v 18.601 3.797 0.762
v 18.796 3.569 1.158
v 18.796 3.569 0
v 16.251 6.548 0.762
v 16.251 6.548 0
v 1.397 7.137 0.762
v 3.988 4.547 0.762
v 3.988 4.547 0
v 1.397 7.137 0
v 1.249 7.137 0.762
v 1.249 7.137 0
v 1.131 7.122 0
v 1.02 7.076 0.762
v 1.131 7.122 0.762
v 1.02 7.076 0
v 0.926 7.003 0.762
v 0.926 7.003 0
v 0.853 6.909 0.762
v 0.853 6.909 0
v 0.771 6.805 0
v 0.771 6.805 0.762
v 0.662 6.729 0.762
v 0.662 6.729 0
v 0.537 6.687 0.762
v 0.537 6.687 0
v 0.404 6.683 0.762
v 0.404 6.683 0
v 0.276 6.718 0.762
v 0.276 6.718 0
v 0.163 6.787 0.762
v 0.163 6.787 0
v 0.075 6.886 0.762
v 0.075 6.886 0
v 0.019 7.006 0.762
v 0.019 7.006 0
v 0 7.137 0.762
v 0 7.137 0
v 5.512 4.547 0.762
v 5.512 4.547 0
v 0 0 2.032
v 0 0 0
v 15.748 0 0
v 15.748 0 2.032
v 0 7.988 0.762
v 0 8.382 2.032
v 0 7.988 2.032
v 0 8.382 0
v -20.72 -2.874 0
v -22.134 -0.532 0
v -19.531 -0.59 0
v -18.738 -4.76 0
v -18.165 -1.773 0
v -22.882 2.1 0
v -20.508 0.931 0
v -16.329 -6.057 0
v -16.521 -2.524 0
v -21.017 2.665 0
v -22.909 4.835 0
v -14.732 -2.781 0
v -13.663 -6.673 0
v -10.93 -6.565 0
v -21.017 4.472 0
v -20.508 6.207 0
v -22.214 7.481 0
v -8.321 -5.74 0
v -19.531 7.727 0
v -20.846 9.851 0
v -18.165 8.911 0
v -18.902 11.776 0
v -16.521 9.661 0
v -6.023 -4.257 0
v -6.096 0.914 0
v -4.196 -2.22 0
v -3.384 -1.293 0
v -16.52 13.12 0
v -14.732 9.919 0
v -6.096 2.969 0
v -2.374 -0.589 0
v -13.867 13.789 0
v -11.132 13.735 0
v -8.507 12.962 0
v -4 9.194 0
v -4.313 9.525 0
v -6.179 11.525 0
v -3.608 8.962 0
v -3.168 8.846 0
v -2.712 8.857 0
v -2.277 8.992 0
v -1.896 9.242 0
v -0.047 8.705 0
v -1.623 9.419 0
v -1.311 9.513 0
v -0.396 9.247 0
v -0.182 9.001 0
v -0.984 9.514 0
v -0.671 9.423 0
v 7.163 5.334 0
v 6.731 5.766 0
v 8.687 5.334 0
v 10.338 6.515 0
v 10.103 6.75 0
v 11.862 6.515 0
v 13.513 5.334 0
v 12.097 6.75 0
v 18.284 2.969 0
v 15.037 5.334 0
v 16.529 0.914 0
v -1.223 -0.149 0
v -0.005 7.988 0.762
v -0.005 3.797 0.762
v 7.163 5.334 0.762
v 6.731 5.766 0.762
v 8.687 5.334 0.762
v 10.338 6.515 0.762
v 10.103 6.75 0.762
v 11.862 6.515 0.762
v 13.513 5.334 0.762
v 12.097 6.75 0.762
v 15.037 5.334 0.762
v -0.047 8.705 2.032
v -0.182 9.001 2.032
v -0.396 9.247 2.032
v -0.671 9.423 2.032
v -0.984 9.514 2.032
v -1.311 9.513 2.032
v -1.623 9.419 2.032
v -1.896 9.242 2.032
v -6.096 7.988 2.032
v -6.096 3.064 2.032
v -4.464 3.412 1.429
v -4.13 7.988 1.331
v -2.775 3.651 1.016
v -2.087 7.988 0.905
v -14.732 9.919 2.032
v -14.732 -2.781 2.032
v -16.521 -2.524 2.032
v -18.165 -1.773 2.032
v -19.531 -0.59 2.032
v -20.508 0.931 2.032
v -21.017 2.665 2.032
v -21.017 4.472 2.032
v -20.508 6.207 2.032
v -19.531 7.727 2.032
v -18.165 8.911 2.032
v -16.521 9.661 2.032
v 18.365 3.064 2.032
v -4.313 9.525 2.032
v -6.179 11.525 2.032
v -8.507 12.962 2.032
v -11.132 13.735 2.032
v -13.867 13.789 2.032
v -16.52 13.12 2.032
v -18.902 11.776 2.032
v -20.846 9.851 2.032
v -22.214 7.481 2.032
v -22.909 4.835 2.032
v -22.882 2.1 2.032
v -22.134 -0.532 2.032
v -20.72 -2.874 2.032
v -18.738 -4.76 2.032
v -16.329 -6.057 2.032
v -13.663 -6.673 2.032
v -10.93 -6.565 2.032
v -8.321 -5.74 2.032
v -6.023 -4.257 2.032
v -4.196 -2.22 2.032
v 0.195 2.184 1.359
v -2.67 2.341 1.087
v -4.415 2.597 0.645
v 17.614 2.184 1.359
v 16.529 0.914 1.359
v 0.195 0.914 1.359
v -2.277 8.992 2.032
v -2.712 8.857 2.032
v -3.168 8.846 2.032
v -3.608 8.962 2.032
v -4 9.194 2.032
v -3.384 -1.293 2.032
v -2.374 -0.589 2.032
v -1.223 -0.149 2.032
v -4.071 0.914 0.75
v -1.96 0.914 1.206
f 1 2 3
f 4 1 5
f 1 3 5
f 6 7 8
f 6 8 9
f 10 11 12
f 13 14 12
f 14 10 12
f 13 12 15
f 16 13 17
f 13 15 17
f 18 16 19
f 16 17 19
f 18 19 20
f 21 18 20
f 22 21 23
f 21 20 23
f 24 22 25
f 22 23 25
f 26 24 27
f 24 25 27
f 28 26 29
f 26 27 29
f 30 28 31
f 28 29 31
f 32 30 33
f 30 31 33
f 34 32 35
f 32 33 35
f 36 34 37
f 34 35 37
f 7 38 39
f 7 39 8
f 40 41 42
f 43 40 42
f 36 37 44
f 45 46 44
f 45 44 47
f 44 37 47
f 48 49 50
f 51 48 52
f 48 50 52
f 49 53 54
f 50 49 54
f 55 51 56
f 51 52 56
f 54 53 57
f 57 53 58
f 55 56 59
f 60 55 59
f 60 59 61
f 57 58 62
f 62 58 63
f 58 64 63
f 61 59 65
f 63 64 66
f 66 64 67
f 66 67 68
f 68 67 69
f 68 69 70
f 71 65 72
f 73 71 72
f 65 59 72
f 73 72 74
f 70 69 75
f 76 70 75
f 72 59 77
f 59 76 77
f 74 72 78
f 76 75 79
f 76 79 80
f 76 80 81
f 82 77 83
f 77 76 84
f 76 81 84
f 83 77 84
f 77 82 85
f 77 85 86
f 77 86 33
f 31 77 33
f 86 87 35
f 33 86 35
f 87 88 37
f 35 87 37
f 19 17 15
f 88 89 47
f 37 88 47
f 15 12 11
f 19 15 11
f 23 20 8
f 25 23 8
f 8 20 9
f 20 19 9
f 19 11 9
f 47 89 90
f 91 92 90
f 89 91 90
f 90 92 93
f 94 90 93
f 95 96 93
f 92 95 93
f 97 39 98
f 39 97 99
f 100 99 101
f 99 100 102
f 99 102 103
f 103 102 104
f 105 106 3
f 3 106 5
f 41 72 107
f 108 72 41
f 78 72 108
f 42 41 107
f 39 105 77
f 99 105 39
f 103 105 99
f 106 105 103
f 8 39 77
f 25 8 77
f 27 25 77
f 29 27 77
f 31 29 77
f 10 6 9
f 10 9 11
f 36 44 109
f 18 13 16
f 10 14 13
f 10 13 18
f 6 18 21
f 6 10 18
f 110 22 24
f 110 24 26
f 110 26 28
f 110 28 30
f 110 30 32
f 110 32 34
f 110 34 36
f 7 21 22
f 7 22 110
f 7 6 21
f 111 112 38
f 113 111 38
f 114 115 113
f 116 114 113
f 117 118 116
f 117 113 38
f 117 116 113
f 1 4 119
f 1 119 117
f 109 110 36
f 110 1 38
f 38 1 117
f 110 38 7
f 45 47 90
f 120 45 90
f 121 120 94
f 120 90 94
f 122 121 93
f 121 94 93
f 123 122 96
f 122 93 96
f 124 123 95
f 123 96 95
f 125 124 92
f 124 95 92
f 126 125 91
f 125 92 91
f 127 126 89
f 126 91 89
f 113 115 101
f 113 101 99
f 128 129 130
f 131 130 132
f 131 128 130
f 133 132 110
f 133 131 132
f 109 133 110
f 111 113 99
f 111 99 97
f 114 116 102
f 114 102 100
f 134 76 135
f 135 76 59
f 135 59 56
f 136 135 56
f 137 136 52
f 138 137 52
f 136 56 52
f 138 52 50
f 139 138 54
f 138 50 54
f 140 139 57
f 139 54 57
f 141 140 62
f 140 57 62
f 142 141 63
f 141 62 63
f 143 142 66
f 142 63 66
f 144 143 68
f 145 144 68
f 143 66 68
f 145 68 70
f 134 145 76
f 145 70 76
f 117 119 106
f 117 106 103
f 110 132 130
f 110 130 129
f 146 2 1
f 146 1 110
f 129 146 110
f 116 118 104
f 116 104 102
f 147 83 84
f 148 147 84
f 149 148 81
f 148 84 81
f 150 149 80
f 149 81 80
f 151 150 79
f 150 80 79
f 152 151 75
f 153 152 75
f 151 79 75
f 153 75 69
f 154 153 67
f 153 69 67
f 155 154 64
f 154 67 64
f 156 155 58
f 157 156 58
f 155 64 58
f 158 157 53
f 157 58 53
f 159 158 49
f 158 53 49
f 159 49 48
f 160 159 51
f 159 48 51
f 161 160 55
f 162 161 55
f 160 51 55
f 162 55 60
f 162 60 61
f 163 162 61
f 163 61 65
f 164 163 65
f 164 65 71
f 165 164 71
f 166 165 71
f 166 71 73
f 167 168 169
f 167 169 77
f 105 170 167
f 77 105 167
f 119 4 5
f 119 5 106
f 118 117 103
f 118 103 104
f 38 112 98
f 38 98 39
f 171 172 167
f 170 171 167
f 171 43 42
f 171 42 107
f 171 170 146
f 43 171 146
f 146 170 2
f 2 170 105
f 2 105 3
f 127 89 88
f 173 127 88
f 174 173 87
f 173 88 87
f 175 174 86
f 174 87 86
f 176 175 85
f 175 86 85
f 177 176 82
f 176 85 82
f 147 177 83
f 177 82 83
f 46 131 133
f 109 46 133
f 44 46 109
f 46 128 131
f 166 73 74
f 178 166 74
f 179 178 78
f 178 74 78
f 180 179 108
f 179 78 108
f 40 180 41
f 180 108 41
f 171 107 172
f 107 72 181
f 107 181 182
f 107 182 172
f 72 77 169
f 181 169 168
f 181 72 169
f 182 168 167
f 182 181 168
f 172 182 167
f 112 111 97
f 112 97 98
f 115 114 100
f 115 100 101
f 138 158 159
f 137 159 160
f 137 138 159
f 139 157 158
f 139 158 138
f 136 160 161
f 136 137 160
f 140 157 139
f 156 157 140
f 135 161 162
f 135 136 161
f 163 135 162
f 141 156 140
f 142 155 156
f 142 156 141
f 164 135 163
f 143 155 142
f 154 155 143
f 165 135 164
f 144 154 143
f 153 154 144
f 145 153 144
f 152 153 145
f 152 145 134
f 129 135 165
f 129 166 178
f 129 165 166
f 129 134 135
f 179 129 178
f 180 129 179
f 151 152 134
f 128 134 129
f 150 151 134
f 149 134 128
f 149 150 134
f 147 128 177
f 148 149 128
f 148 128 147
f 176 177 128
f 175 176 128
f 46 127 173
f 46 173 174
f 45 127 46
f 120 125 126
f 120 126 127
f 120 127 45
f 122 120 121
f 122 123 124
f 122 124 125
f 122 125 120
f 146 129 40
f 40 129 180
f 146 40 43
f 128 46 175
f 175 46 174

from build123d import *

# Parameters (mm, degrees)
BOSS_EXTRUDE1_DEPTH = 2.032
CUT_EXTRUDE2_DEPTH  = 24.892
FILLET1_R           = 15.24
CUT_EXTRUDE3_DEPTH  = 27.869973793


with BuildPart() as part:
    # Sketch1 → Boss-Extrude1 (new body)
    with BuildSketch(Plane.XY):
        with BuildLine():
            Line((0, 0), (15.748, 0))
            Line((15.748, 0), (18.796, 3.5687))
            Line((18.796, 3.5687), (15.748, 7.1374))
            Line((15.748, 7.1374), (1.249093629, 7.1374))
            ThreePointArc((1.249093629, 7.1374), (1.020493629, 7.076146815), (0.853146815, 6.9088))
            ThreePointArc((0.853146815, 6.9088), (0.338867933, 6.695778712), (0, 7.1374))
            Line((0, 7.1374), (0, 8.382))
            ThreePointArc((0, 8.382), (-0.671156766, 9.42306338), (-1.896435629, 9.241525307))
            ThreePointArc((-1.896435629, 9.241525307), (-3.167624386, 8.846252494), (-4.312815757, 9.525))
            ThreePointArc((-4.312815757, 9.525), (-22.986492034, 3.466471629), (-4.196095201, -2.219734364))
            ThreePointArc((-4.196095201, -2.219734364), (-2.373522466, -0.589120746), (0, 0))
        make_face()
        with BuildLine():
            Line((-14.732, 9.9187), (-14.732, -2.7813))
            ThreePointArc((-14.732, -2.7813), (-21.082, 3.5687), (-14.732, 9.9187))
        make_face(mode=Mode.SUBTRACT)
    extrude(amount=BOSS_EXTRUDE1_DEPTH)

    # Sketch2 → Cut-Extrude2 (cut)
    with BuildSketch(Plane(origin=(18.796, 0, 0), x_dir=(0, 0, -1), z_dir=(1, 0, 0))):
        Polygon((0, 0.9144), (-1.3589, 0.9144), (-1.3589, 2.1844), (0, 2.968961281), align=None)
        Polygon((-0.762, 3.7973), (-2.032, 3.064065158), (-2.032, 7.9883), (-0.762, 7.9883), align=None)
    extrude(amount=-CUT_EXTRUDE2_DEPTH, mode=Mode.SUBTRACT)

    # Fillet1
    # the kernel refuses this fillet: 15.24 mm, written as the material it adds along each edge
    with BuildSketch(Plane(origin=(-6.096, 0.9144, 1.3589), x_dir=(0, 0, -1), z_dir=(0, 1, 0))) as fillet1_piece_1_section:
        with BuildLine():
            CenterArc((15.24, -6.29068063), FILLET1_R, 155.620767223, 24.379232777)
            Line((0, -6.29068063), (-0.3048, -6.29068063))
            Line((-0.3048, -6.29068063), (-0.3048, 0))
            Line((-0.3048, 0), (0, 0.3048))
            ThreePointArc((0, 0.3048), (0.67945, 0.3048), (1.081278, 0.125813613))
            Line((1.081278, 0.125813613), (1.3589, 0))
        make_face()
    fillet1_piece_1 = extrude(amount=16.996701575, mode=Mode.PRIVATE)
    fillet1_piece_1 = split(fillet1_piece_1, bisect_by=Plane(origin=(-4.21750285, 2.15532175, 1.409265006), z_dir=(0, -0.8660254037844416, -0.49999999999999506)), keep=Keep.TOP, mode=Mode.PRIVATE)
    add(fillet1_piece_1)
    with BuildSketch(Plane(origin=(-6.096, 7.9883, 0.762), x_dir=(0, 0, 1), z_dir=(0, -1, 0))) as fillet1_piece_2_section:
        with BuildLine():
            CenterArc((15.24, -6.090706035), FILLET1_R, 156.443535691, 23.556464309)
            Line((0, -6.090706035), (-0.3048, -6.090706035))
            Line((-0.3048, -6.090706035), (-0.3048, 0))
            Line((-0.3048, 0), (0, 0.3048))
            ThreePointArc((0, 0.3048), (0.635, 0.3048), (0.9906, 0.121814121))
            Line((0.9906, 0.121814121), (1.27, 0))
        make_face()
    fillet1_piece_2 = extrude(amount=19.417765087, mode=Mode.PRIVATE)
    fillet1_piece_2 = split(fillet1_piece_2, bisect_by=Plane(origin=(-4.154309829, 4.225398766, 0.020511187), z_dir=(0, 0.8660254037844416, 0.49999999999999506)), keep=Keep.TOP, mode=Mode.PRIVATE)
    add(fillet1_piece_2)

    # Sketch3 → Cut-Extrude3 (cut, through all)
    with BuildSketch(Plane.XY.offset(0.762)):
        Polygon((18.796, 7.9883), (18.796, 3.5687), (16.25112476, 6.54832476), (15.0368, 5.334), (13.5128, 5.334), (12.09675, 6.75005), (11.8618, 6.5151), (10.3378, 6.5151), (10.10285, 6.75005), (8.6868, 5.334), (7.1628, 5.334), (6.731, 5.7658), (5.5118, 4.5466), (3.9878, 4.5466), (0.5461, 7.9883), align=None)
    extrude(amount=-CUT_EXTRUDE3_DEPTH, mode=Mode.SUBTRACT)


solid = part.part
